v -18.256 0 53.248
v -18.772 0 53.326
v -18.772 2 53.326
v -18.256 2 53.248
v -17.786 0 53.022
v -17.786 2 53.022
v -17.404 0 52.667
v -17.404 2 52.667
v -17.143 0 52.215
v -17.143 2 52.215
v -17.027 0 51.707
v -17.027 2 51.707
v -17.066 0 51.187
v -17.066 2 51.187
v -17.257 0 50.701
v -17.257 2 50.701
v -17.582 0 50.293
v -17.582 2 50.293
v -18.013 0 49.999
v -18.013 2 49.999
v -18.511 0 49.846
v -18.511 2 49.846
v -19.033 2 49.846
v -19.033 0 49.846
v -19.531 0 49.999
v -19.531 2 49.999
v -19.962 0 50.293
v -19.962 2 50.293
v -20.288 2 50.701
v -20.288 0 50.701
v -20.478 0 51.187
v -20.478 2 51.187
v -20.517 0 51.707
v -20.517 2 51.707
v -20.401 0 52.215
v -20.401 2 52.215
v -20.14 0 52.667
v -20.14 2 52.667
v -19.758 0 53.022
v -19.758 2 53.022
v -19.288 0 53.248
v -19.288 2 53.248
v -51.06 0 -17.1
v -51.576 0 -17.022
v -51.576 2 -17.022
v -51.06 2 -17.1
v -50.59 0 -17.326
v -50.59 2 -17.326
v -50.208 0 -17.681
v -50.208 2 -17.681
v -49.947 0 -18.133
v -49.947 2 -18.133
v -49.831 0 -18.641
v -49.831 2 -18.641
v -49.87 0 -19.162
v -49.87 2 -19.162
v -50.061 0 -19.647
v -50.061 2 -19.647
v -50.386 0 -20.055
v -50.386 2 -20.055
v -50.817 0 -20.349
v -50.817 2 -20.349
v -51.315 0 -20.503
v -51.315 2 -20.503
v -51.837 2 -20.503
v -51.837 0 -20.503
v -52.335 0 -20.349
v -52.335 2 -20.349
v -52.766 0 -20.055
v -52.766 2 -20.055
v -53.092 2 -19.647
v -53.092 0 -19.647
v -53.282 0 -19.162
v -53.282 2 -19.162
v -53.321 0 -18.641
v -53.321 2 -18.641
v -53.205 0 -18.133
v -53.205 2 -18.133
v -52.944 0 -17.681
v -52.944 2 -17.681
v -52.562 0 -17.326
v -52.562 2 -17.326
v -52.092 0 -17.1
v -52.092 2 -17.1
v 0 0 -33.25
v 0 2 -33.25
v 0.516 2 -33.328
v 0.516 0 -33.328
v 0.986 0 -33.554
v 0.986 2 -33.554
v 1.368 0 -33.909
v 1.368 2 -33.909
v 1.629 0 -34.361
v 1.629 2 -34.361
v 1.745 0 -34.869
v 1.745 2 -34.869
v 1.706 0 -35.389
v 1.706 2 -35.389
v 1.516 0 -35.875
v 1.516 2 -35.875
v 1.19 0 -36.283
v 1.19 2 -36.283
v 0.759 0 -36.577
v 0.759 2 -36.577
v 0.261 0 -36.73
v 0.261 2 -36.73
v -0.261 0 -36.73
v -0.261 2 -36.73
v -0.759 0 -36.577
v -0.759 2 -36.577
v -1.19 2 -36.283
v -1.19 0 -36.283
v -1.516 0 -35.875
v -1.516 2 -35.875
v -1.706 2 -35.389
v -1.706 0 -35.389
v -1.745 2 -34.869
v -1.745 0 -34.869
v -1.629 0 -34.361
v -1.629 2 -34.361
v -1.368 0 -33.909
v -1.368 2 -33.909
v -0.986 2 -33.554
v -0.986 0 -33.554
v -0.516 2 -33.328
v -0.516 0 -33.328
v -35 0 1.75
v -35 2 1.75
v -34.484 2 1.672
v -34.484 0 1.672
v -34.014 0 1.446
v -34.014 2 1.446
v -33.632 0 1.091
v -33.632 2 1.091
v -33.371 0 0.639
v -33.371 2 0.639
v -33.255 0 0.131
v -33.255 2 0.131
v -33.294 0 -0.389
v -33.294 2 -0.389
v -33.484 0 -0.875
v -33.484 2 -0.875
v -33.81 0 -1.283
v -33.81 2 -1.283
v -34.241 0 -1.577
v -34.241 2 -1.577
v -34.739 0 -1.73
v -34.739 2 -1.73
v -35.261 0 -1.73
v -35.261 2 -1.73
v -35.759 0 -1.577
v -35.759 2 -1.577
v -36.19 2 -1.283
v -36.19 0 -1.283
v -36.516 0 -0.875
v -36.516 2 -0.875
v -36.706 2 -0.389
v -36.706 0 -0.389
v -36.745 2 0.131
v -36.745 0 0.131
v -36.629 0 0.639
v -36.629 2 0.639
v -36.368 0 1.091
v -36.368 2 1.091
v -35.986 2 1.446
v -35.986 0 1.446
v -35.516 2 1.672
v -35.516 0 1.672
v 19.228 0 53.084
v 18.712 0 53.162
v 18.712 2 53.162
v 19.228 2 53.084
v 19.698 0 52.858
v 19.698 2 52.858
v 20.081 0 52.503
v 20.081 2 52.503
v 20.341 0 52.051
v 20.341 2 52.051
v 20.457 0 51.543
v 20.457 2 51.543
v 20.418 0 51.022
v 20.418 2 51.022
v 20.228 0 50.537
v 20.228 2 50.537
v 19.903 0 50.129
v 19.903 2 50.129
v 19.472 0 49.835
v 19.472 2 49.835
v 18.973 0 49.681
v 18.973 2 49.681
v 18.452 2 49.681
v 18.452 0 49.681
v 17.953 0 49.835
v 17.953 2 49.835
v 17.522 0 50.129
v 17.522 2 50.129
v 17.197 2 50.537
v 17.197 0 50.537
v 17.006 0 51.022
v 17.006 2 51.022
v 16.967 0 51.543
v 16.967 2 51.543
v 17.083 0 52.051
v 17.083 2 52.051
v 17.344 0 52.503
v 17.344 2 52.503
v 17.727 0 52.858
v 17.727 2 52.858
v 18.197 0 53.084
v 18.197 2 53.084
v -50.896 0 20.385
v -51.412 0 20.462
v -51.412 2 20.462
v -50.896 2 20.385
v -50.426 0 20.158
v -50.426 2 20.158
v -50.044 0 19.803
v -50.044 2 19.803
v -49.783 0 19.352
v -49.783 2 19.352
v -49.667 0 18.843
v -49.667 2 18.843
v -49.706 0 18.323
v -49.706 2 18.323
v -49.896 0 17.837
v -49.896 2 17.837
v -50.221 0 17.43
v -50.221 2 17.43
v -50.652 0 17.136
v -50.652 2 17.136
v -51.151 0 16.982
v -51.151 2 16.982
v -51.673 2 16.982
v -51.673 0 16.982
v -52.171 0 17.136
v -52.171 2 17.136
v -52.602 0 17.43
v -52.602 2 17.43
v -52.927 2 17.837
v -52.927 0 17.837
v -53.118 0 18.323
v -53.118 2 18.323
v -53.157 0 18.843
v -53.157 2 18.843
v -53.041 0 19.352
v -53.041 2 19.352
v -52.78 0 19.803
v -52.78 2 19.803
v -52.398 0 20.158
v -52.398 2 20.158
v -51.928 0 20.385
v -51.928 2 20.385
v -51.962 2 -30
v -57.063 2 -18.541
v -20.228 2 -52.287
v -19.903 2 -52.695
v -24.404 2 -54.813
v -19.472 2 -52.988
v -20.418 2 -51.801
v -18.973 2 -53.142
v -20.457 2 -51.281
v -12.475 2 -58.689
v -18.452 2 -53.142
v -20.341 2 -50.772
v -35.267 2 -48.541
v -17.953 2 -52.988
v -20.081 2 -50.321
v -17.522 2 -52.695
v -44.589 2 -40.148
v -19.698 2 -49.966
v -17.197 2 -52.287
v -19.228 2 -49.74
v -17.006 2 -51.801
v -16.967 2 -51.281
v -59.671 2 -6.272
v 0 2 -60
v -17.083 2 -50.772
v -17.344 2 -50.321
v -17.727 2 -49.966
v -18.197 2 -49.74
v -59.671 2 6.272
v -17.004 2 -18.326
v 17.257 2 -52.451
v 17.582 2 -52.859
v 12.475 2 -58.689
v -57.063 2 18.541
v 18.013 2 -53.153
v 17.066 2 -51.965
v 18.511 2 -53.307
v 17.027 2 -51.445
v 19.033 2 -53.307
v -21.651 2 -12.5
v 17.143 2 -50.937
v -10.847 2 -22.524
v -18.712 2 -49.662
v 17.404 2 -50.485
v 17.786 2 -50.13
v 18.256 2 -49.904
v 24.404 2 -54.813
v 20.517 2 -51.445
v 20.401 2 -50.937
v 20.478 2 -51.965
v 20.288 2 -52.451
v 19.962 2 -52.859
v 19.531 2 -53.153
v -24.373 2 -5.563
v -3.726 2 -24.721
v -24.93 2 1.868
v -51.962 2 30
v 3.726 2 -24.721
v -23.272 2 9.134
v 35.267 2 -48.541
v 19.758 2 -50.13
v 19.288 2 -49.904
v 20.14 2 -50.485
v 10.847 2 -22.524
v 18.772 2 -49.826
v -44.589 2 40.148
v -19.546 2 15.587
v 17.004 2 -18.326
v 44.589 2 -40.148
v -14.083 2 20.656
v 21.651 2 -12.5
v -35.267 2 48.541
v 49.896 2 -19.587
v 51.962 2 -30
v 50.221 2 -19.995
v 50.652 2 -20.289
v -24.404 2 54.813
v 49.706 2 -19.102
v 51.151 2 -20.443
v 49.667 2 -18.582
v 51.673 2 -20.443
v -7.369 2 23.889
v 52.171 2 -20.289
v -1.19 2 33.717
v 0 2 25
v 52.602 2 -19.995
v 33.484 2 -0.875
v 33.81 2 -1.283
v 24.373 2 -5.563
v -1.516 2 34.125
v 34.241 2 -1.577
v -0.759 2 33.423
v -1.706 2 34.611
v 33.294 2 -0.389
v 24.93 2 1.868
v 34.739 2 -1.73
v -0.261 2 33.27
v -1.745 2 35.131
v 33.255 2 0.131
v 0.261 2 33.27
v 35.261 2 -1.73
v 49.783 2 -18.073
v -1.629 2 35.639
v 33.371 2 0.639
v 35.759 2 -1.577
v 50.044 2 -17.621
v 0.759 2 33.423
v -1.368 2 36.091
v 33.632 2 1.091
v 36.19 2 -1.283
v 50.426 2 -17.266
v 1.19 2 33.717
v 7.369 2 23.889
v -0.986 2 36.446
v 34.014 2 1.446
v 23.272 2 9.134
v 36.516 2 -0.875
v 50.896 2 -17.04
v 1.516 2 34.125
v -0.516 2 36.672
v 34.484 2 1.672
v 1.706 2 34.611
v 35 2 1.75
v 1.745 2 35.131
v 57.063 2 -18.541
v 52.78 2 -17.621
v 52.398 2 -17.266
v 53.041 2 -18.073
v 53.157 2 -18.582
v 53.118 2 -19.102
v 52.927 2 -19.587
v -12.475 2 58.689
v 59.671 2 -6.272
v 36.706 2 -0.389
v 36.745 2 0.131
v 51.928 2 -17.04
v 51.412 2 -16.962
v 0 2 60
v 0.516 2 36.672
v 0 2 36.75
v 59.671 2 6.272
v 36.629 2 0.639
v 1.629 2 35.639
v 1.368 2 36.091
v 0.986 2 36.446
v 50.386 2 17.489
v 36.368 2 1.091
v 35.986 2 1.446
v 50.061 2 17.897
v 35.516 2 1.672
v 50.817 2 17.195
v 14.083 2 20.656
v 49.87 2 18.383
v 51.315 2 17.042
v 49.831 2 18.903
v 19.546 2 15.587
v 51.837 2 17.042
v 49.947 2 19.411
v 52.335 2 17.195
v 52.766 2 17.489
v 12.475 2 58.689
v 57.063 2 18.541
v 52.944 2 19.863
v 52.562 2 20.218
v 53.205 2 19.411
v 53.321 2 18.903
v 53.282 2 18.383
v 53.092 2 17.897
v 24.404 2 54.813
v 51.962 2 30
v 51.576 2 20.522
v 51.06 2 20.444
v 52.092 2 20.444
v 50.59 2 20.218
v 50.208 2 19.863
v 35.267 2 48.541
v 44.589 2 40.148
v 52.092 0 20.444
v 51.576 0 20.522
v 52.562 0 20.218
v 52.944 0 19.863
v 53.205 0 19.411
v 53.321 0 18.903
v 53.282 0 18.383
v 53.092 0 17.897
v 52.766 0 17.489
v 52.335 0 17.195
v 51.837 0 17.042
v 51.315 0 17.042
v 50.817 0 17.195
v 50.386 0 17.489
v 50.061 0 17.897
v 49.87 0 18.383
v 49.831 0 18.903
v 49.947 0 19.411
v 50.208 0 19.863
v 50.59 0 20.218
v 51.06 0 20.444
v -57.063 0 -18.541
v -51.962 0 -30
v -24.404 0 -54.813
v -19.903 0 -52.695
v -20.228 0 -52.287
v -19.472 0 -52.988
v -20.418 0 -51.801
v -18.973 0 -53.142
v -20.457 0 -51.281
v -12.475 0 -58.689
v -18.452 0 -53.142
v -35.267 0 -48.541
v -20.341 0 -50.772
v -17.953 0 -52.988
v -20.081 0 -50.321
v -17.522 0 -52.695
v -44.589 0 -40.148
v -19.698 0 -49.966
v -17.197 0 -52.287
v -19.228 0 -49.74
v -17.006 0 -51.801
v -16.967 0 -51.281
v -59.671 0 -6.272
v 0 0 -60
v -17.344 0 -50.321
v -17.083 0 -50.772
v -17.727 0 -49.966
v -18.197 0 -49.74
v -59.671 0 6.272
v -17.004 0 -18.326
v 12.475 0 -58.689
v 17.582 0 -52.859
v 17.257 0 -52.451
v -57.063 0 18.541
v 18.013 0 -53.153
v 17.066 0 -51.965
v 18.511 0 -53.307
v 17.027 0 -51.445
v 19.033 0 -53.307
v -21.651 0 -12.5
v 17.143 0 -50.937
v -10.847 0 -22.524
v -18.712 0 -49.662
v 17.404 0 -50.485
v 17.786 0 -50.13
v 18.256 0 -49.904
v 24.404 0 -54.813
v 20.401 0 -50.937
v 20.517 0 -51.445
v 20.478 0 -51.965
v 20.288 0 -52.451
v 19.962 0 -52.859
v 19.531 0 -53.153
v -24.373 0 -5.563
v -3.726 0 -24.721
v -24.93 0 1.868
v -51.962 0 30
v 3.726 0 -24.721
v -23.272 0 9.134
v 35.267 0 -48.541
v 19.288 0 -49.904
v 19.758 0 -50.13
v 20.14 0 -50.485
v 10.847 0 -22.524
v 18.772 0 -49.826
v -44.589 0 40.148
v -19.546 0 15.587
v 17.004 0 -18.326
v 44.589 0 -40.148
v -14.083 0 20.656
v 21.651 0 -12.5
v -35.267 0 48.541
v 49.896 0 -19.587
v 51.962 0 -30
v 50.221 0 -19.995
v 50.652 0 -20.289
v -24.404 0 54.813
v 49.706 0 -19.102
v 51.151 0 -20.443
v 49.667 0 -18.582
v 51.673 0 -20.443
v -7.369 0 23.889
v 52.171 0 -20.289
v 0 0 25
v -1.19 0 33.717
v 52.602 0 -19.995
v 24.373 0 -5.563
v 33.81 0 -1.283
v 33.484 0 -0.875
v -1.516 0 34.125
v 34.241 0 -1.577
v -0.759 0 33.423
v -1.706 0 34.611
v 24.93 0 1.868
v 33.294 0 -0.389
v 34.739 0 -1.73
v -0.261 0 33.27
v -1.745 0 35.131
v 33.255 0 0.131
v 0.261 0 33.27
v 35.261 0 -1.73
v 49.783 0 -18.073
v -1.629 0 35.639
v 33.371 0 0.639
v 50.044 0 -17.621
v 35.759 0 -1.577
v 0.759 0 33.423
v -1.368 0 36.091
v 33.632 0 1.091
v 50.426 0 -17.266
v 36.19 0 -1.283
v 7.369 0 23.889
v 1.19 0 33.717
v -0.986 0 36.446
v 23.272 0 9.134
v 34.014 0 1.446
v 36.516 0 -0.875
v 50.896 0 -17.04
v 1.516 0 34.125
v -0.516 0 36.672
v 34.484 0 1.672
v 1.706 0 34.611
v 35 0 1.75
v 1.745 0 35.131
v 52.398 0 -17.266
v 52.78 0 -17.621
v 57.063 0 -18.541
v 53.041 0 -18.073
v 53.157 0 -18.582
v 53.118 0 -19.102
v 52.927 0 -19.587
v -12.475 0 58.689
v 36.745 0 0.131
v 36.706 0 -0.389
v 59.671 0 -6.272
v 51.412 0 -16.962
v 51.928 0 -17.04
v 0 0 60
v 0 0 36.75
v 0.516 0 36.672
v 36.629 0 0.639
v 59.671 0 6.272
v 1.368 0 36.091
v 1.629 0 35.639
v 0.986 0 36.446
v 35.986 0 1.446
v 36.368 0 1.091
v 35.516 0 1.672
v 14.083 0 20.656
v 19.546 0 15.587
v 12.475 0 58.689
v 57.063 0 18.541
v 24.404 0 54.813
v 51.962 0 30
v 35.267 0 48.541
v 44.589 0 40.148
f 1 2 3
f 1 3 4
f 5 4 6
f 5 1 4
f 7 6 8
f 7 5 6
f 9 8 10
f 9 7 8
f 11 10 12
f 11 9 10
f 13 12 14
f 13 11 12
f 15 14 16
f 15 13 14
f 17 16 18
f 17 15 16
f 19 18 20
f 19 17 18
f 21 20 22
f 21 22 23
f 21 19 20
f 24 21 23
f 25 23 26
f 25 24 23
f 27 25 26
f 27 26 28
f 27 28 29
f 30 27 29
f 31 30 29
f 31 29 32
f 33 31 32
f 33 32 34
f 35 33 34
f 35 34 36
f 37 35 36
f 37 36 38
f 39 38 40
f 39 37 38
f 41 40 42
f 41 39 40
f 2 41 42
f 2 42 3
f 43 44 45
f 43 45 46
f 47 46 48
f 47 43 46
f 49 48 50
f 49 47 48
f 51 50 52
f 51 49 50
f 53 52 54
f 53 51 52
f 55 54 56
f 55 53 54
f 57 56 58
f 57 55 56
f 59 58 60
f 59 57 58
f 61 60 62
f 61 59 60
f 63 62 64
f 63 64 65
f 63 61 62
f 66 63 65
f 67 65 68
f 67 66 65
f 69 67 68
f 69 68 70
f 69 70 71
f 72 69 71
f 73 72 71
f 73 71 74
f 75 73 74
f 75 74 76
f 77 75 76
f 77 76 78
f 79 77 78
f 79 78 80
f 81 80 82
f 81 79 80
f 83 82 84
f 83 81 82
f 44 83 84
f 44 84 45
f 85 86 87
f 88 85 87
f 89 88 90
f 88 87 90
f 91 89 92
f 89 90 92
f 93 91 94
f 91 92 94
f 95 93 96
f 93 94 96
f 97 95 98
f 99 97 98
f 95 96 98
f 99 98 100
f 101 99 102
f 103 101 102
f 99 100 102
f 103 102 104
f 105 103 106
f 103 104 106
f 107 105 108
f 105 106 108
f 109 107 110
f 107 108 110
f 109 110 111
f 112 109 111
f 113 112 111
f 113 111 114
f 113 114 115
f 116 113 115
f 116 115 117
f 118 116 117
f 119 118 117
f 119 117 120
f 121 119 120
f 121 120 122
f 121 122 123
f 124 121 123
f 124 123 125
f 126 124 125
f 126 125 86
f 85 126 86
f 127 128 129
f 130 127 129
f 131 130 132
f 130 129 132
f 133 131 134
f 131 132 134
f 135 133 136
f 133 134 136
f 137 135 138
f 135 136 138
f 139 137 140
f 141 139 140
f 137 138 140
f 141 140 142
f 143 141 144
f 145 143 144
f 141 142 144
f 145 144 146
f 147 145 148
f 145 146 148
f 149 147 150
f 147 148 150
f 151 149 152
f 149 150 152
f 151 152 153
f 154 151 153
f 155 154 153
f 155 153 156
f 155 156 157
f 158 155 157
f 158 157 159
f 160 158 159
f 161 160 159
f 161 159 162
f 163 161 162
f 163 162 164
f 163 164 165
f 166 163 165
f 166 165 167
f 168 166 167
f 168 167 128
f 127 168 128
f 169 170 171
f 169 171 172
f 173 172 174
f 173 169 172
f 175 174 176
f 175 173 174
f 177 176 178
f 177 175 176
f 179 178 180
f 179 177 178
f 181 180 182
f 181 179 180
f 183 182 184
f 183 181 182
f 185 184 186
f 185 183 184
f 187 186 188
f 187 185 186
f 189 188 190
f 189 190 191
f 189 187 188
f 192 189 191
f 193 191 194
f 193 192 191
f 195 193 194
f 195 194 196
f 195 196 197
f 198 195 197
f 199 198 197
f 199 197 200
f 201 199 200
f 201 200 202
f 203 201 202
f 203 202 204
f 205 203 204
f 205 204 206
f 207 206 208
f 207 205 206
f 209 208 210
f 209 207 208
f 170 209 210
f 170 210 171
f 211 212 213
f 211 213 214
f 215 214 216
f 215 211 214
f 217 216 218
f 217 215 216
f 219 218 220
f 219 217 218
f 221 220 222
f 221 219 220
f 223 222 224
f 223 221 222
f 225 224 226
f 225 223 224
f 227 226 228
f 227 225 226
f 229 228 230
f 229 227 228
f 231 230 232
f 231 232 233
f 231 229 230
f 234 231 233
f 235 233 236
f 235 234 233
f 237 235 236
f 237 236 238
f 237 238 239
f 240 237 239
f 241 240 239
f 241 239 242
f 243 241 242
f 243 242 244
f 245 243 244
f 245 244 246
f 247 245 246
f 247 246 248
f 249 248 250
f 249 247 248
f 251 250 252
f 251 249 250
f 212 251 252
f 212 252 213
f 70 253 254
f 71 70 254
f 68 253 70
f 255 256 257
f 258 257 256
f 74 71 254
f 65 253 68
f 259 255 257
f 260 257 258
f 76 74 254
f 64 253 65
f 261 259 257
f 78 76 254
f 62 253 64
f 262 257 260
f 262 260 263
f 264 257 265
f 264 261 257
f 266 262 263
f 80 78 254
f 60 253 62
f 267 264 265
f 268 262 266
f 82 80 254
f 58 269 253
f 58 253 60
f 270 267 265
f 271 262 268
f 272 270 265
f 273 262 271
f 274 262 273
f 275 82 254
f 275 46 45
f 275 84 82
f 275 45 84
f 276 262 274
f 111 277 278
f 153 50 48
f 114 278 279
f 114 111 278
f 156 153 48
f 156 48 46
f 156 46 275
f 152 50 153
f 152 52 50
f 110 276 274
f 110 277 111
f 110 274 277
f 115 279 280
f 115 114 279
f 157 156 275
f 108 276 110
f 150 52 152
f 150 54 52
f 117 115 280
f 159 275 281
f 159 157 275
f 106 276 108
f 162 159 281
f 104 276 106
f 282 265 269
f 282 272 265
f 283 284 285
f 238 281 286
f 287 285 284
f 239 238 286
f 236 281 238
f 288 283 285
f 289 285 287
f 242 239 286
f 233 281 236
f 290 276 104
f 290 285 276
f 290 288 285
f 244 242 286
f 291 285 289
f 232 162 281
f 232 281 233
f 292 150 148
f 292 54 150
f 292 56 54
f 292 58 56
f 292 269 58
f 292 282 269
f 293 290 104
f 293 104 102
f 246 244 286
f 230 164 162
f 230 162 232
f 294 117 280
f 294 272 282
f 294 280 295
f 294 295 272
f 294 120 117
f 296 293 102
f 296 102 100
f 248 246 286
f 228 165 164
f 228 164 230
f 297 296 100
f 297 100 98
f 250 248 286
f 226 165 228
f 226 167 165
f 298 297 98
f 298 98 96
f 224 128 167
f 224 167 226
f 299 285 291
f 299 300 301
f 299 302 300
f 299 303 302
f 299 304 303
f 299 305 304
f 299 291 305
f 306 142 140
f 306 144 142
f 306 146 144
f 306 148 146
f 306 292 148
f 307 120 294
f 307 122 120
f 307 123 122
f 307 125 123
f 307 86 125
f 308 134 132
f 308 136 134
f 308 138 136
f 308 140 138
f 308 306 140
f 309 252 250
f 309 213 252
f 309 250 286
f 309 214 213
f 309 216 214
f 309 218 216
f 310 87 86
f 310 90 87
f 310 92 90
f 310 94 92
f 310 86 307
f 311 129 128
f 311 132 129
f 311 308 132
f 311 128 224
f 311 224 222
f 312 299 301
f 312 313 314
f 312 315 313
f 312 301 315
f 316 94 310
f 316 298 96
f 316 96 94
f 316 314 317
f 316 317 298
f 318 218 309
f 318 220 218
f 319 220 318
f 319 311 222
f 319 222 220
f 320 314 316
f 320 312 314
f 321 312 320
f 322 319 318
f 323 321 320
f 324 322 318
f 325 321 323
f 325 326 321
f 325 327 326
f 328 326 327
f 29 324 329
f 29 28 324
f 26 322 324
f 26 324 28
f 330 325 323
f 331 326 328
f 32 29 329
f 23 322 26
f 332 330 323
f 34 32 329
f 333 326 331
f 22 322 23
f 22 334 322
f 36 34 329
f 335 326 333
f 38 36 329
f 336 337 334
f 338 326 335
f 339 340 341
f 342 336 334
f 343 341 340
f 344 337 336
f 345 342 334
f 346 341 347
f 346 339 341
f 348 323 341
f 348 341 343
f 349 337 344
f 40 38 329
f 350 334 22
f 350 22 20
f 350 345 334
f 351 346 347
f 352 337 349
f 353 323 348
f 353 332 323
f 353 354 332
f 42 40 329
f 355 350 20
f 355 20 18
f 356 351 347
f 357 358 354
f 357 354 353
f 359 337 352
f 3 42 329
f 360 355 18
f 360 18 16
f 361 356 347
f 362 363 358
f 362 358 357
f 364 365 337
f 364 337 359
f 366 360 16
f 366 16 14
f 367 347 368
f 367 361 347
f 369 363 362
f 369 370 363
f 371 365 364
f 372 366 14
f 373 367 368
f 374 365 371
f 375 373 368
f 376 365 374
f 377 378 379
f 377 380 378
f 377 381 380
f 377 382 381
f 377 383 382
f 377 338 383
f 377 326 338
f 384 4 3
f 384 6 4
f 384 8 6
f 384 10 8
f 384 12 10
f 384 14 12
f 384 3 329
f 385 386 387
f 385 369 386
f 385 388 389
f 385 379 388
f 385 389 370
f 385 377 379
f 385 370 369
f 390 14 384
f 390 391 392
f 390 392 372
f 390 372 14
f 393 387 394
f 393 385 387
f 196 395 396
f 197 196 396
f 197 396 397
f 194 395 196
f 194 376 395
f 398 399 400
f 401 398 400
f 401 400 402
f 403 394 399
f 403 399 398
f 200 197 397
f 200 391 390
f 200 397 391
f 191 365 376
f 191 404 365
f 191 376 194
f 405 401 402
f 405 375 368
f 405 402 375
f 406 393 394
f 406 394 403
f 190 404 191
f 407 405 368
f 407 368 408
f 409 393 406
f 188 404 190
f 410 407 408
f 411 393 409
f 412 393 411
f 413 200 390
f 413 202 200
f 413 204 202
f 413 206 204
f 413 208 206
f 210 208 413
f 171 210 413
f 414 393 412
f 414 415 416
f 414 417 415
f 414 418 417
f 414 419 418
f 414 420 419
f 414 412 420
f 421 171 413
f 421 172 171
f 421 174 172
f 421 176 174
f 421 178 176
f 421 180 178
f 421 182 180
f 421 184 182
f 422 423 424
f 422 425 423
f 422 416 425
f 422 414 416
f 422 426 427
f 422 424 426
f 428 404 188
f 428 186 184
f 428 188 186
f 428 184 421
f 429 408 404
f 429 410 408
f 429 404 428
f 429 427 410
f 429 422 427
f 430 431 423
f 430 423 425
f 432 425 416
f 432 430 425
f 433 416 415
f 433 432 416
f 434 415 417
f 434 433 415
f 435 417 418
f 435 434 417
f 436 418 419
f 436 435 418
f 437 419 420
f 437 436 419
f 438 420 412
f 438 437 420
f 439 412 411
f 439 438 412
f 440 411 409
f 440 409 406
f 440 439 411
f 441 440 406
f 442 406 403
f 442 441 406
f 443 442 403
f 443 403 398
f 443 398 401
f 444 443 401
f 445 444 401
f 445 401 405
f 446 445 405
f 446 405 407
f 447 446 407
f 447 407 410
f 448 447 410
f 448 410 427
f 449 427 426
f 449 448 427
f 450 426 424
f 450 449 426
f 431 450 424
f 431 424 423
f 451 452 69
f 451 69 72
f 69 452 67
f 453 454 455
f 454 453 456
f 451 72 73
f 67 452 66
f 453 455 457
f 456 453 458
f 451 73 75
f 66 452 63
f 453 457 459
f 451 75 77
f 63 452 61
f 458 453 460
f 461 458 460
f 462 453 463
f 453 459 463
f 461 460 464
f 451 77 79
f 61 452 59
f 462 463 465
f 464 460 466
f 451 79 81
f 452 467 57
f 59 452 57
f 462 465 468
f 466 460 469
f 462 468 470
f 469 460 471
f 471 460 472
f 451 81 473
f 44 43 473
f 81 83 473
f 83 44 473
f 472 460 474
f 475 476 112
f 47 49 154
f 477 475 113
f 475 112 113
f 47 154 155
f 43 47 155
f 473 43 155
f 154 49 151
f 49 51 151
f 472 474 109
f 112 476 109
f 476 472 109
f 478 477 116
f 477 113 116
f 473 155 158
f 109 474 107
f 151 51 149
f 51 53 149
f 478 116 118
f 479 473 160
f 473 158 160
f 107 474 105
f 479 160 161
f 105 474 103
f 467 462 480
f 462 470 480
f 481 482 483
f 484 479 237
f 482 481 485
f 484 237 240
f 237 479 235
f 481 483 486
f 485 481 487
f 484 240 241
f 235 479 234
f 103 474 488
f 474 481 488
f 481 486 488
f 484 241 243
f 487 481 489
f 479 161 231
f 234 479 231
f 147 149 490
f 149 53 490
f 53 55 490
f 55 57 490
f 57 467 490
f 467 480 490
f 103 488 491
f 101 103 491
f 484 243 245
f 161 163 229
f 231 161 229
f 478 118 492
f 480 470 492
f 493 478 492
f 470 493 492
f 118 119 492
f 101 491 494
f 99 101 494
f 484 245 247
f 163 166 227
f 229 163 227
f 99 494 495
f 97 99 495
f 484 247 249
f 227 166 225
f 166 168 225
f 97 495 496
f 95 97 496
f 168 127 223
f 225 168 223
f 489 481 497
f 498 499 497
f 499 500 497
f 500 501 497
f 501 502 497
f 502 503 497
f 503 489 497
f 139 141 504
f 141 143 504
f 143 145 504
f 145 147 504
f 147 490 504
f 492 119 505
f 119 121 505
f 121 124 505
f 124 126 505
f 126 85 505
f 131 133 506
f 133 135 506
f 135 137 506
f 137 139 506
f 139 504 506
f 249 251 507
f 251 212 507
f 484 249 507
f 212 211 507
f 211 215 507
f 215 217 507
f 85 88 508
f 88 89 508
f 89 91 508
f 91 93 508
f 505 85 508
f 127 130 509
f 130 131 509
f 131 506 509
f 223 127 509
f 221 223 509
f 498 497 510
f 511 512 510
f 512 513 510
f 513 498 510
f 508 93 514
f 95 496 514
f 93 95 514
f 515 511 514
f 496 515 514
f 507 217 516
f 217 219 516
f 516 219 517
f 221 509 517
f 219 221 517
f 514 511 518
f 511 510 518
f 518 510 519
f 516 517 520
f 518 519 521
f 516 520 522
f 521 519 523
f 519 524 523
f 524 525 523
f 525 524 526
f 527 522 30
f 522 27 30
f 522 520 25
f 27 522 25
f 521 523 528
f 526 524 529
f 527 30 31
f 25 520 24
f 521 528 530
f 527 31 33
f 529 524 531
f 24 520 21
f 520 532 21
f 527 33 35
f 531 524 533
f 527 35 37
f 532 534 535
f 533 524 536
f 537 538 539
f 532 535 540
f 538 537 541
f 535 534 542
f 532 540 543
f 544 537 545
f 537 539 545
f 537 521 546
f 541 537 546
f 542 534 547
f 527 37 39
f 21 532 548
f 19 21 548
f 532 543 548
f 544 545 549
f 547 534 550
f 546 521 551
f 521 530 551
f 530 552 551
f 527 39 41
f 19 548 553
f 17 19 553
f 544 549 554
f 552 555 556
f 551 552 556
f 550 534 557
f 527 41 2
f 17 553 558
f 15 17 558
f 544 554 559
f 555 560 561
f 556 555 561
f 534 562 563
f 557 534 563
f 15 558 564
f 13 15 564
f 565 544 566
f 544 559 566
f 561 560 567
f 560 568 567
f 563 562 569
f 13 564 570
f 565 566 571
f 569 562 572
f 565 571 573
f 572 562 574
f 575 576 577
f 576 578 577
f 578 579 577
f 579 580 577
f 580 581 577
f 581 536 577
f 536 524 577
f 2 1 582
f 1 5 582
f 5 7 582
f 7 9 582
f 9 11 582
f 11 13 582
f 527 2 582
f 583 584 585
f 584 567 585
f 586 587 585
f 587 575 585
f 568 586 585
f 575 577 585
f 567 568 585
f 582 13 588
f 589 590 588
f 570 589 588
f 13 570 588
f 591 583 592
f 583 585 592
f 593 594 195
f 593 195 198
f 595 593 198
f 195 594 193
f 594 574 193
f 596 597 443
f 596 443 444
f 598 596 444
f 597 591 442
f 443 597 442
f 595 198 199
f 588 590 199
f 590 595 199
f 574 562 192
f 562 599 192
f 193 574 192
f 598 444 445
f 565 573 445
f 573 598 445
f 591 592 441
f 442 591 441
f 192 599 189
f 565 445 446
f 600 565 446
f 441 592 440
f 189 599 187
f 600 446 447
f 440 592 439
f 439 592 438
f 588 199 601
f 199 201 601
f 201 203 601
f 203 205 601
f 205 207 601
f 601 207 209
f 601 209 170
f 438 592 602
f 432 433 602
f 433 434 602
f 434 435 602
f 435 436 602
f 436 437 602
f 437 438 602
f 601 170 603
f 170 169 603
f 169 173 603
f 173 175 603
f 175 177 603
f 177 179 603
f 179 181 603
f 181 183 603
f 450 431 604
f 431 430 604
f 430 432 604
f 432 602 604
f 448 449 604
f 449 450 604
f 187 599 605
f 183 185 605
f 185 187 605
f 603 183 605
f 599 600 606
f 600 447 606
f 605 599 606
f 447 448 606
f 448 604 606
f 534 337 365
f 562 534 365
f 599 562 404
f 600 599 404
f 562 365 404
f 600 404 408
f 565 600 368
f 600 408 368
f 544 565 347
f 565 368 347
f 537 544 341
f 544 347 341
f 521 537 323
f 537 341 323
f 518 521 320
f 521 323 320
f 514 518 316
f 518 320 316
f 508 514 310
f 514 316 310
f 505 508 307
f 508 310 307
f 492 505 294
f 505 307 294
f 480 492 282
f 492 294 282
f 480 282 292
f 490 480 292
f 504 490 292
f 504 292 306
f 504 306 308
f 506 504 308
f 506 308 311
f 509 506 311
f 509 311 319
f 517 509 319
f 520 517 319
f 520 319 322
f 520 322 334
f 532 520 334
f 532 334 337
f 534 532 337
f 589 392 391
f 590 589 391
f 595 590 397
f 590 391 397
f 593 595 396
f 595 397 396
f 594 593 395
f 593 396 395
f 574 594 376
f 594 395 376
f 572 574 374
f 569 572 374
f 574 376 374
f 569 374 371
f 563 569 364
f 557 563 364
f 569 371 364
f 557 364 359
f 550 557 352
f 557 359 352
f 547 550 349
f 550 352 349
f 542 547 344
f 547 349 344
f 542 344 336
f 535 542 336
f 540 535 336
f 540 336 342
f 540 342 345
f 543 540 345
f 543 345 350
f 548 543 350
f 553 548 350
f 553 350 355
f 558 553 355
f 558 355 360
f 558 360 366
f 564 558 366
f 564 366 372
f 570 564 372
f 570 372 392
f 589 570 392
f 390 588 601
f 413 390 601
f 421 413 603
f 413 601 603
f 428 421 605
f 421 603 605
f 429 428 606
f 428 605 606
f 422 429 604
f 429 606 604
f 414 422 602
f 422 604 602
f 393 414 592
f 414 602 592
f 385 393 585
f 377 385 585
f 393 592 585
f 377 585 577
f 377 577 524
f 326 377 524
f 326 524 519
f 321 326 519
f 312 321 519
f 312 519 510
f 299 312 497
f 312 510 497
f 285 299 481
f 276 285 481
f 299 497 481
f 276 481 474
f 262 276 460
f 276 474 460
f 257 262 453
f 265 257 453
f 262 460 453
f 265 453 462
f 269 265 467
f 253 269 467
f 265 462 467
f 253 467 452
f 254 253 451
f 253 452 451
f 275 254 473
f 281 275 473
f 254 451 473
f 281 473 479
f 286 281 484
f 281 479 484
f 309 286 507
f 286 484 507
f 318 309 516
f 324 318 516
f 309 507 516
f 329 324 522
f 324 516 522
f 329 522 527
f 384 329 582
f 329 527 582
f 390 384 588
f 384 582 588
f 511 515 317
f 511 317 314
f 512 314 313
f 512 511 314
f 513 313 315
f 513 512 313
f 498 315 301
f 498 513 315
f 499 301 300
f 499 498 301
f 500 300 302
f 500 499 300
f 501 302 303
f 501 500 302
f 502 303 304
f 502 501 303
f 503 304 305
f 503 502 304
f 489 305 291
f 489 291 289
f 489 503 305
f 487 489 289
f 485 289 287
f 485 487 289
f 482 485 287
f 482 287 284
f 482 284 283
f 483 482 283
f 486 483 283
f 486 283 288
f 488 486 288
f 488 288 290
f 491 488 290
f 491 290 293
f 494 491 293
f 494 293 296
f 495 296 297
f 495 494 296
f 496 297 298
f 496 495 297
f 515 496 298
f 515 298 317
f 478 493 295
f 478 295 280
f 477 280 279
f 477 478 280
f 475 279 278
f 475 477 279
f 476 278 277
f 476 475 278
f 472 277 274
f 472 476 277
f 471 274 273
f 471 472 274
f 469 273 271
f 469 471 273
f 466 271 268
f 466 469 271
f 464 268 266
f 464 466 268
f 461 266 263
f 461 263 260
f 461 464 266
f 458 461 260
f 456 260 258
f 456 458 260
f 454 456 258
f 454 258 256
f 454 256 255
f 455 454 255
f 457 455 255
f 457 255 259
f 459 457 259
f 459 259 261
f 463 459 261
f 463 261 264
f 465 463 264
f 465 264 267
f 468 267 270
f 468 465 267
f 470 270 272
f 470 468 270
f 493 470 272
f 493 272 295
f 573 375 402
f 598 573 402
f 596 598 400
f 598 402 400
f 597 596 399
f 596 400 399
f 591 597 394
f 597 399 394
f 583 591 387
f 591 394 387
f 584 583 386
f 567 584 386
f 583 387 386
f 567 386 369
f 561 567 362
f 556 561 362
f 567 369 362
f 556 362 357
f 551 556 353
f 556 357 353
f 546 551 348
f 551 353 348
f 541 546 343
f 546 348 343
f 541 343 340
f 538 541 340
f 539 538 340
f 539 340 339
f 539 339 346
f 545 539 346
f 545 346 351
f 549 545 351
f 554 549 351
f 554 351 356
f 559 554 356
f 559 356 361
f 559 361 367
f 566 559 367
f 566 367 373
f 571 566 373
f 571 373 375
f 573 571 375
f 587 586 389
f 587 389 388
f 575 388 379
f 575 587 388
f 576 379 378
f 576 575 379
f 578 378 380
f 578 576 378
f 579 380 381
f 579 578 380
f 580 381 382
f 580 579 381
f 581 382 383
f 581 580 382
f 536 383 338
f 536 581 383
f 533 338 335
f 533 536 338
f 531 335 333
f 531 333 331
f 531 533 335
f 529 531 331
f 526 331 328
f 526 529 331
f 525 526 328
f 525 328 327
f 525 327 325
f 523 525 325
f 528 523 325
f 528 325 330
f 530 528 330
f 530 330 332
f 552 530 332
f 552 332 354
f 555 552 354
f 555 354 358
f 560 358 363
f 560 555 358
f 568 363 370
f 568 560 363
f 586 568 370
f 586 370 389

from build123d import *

# Parameters (mm, degrees)
IZIM1_R                     = 60
IZIM1_R_2                   = 1.75
Y_KSEKLIK_EKSTR_ZYON1_DEPTH = 2
IZIM2_R                     = 1.75
KES_EKSTR_ZYON1_DEPTH       = 10
IZIM3_R                     = 25
KES_EKSTR_ZYON2_DEPTH       = 10


with BuildPart() as part:
    # Çizim1 → Yükseklik-Ekstrüzyon1 (new body)
    with BuildSketch(Plane(origin=(0, 0, 0), x_dir=(1, 0, 0), z_dir=(0, 1, 0))):
        with Locations(Location((0, 0, 0), (0, 0, 270))):
            Circle(IZIM1_R)
        with Locations(Location((-51.576054603, 18.772148676, 0), (0, 0, 270))):
            Circle(IZIM1_R_2, mode=Mode.SUBTRACT)
        with Locations(Location((-18.712348032, 51.411753683, 0), (0, 0, 270))):
            Circle(IZIM1_R_2, mode=Mode.SUBTRACT)
        with Locations(Location((18.772148676, 51.576054603, 0), (0, 0, 270))):
            Circle(IZIM1_R_2, mode=Mode.SUBTRACT)
        with Locations(Location((51.411753683, 18.712348032, 0), (0, 0, 270))):
            Circle(IZIM1_R_2, mode=Mode.SUBTRACT)
        with Locations(Location((51.576054603, -18.772148676, 0), (0, 0, 270))):
            Circle(IZIM1_R_2, mode=Mode.SUBTRACT)
        with Locations(Location((18.712348032, -51.411753683, 0), (0, 0, 270))):
            Circle(IZIM1_R_2, mode=Mode.SUBTRACT)
        with Locations(Location((-18.772148676, -51.576054603, 0), (0, 0, 270))):
            Circle(IZIM1_R_2, mode=Mode.SUBTRACT)
        with Locations(Location((-51.411753683, -18.712348032, 0), (0, 0, 270))):
            Circle(IZIM1_R_2, mode=Mode.SUBTRACT)
    extrude(amount=Y_KSEKLIK_EKSTR_ZYON1_DEPTH)

    # Çizim2 → Kes-Ekstrüzyon1 (cut)
    with BuildSketch(Plane(origin=(0, 2, 0), x_dir=(1, 0, 0), z_dir=(0, 1, 0))):
        with Locations(Location((0, 35, 0), (0, 0, 270))):
            Circle(IZIM2_R)
        with Locations(Location((35, 0, 0), (0, 0, 270))):
            Circle(IZIM2_R)
        with Locations(Location((0, -35, 0), (0, 0, 270))):
            Circle(IZIM2_R)
        with Locations(Location((-35, 0, 0), (0, 0, 270))):
            Circle(IZIM2_R)
    extrude(amount=-KES_EKSTR_ZYON1_DEPTH, mode=Mode.SUBTRACT)

    # Çizim3 → Kes-Ekstrüzyon2 (cut)
    with BuildSketch(Plane(origin=(0, 2, 0), x_dir=(1, 0, 0), z_dir=(0, 1, 0))):
        with Locations(Location((0, 0, 0), (0, 0, 270))):
            Circle(IZIM3_R)
    extrude(amount=-KES_EKSTR_ZYON2_DEPTH, mode=Mode.SUBTRACT)


solid = part.part
